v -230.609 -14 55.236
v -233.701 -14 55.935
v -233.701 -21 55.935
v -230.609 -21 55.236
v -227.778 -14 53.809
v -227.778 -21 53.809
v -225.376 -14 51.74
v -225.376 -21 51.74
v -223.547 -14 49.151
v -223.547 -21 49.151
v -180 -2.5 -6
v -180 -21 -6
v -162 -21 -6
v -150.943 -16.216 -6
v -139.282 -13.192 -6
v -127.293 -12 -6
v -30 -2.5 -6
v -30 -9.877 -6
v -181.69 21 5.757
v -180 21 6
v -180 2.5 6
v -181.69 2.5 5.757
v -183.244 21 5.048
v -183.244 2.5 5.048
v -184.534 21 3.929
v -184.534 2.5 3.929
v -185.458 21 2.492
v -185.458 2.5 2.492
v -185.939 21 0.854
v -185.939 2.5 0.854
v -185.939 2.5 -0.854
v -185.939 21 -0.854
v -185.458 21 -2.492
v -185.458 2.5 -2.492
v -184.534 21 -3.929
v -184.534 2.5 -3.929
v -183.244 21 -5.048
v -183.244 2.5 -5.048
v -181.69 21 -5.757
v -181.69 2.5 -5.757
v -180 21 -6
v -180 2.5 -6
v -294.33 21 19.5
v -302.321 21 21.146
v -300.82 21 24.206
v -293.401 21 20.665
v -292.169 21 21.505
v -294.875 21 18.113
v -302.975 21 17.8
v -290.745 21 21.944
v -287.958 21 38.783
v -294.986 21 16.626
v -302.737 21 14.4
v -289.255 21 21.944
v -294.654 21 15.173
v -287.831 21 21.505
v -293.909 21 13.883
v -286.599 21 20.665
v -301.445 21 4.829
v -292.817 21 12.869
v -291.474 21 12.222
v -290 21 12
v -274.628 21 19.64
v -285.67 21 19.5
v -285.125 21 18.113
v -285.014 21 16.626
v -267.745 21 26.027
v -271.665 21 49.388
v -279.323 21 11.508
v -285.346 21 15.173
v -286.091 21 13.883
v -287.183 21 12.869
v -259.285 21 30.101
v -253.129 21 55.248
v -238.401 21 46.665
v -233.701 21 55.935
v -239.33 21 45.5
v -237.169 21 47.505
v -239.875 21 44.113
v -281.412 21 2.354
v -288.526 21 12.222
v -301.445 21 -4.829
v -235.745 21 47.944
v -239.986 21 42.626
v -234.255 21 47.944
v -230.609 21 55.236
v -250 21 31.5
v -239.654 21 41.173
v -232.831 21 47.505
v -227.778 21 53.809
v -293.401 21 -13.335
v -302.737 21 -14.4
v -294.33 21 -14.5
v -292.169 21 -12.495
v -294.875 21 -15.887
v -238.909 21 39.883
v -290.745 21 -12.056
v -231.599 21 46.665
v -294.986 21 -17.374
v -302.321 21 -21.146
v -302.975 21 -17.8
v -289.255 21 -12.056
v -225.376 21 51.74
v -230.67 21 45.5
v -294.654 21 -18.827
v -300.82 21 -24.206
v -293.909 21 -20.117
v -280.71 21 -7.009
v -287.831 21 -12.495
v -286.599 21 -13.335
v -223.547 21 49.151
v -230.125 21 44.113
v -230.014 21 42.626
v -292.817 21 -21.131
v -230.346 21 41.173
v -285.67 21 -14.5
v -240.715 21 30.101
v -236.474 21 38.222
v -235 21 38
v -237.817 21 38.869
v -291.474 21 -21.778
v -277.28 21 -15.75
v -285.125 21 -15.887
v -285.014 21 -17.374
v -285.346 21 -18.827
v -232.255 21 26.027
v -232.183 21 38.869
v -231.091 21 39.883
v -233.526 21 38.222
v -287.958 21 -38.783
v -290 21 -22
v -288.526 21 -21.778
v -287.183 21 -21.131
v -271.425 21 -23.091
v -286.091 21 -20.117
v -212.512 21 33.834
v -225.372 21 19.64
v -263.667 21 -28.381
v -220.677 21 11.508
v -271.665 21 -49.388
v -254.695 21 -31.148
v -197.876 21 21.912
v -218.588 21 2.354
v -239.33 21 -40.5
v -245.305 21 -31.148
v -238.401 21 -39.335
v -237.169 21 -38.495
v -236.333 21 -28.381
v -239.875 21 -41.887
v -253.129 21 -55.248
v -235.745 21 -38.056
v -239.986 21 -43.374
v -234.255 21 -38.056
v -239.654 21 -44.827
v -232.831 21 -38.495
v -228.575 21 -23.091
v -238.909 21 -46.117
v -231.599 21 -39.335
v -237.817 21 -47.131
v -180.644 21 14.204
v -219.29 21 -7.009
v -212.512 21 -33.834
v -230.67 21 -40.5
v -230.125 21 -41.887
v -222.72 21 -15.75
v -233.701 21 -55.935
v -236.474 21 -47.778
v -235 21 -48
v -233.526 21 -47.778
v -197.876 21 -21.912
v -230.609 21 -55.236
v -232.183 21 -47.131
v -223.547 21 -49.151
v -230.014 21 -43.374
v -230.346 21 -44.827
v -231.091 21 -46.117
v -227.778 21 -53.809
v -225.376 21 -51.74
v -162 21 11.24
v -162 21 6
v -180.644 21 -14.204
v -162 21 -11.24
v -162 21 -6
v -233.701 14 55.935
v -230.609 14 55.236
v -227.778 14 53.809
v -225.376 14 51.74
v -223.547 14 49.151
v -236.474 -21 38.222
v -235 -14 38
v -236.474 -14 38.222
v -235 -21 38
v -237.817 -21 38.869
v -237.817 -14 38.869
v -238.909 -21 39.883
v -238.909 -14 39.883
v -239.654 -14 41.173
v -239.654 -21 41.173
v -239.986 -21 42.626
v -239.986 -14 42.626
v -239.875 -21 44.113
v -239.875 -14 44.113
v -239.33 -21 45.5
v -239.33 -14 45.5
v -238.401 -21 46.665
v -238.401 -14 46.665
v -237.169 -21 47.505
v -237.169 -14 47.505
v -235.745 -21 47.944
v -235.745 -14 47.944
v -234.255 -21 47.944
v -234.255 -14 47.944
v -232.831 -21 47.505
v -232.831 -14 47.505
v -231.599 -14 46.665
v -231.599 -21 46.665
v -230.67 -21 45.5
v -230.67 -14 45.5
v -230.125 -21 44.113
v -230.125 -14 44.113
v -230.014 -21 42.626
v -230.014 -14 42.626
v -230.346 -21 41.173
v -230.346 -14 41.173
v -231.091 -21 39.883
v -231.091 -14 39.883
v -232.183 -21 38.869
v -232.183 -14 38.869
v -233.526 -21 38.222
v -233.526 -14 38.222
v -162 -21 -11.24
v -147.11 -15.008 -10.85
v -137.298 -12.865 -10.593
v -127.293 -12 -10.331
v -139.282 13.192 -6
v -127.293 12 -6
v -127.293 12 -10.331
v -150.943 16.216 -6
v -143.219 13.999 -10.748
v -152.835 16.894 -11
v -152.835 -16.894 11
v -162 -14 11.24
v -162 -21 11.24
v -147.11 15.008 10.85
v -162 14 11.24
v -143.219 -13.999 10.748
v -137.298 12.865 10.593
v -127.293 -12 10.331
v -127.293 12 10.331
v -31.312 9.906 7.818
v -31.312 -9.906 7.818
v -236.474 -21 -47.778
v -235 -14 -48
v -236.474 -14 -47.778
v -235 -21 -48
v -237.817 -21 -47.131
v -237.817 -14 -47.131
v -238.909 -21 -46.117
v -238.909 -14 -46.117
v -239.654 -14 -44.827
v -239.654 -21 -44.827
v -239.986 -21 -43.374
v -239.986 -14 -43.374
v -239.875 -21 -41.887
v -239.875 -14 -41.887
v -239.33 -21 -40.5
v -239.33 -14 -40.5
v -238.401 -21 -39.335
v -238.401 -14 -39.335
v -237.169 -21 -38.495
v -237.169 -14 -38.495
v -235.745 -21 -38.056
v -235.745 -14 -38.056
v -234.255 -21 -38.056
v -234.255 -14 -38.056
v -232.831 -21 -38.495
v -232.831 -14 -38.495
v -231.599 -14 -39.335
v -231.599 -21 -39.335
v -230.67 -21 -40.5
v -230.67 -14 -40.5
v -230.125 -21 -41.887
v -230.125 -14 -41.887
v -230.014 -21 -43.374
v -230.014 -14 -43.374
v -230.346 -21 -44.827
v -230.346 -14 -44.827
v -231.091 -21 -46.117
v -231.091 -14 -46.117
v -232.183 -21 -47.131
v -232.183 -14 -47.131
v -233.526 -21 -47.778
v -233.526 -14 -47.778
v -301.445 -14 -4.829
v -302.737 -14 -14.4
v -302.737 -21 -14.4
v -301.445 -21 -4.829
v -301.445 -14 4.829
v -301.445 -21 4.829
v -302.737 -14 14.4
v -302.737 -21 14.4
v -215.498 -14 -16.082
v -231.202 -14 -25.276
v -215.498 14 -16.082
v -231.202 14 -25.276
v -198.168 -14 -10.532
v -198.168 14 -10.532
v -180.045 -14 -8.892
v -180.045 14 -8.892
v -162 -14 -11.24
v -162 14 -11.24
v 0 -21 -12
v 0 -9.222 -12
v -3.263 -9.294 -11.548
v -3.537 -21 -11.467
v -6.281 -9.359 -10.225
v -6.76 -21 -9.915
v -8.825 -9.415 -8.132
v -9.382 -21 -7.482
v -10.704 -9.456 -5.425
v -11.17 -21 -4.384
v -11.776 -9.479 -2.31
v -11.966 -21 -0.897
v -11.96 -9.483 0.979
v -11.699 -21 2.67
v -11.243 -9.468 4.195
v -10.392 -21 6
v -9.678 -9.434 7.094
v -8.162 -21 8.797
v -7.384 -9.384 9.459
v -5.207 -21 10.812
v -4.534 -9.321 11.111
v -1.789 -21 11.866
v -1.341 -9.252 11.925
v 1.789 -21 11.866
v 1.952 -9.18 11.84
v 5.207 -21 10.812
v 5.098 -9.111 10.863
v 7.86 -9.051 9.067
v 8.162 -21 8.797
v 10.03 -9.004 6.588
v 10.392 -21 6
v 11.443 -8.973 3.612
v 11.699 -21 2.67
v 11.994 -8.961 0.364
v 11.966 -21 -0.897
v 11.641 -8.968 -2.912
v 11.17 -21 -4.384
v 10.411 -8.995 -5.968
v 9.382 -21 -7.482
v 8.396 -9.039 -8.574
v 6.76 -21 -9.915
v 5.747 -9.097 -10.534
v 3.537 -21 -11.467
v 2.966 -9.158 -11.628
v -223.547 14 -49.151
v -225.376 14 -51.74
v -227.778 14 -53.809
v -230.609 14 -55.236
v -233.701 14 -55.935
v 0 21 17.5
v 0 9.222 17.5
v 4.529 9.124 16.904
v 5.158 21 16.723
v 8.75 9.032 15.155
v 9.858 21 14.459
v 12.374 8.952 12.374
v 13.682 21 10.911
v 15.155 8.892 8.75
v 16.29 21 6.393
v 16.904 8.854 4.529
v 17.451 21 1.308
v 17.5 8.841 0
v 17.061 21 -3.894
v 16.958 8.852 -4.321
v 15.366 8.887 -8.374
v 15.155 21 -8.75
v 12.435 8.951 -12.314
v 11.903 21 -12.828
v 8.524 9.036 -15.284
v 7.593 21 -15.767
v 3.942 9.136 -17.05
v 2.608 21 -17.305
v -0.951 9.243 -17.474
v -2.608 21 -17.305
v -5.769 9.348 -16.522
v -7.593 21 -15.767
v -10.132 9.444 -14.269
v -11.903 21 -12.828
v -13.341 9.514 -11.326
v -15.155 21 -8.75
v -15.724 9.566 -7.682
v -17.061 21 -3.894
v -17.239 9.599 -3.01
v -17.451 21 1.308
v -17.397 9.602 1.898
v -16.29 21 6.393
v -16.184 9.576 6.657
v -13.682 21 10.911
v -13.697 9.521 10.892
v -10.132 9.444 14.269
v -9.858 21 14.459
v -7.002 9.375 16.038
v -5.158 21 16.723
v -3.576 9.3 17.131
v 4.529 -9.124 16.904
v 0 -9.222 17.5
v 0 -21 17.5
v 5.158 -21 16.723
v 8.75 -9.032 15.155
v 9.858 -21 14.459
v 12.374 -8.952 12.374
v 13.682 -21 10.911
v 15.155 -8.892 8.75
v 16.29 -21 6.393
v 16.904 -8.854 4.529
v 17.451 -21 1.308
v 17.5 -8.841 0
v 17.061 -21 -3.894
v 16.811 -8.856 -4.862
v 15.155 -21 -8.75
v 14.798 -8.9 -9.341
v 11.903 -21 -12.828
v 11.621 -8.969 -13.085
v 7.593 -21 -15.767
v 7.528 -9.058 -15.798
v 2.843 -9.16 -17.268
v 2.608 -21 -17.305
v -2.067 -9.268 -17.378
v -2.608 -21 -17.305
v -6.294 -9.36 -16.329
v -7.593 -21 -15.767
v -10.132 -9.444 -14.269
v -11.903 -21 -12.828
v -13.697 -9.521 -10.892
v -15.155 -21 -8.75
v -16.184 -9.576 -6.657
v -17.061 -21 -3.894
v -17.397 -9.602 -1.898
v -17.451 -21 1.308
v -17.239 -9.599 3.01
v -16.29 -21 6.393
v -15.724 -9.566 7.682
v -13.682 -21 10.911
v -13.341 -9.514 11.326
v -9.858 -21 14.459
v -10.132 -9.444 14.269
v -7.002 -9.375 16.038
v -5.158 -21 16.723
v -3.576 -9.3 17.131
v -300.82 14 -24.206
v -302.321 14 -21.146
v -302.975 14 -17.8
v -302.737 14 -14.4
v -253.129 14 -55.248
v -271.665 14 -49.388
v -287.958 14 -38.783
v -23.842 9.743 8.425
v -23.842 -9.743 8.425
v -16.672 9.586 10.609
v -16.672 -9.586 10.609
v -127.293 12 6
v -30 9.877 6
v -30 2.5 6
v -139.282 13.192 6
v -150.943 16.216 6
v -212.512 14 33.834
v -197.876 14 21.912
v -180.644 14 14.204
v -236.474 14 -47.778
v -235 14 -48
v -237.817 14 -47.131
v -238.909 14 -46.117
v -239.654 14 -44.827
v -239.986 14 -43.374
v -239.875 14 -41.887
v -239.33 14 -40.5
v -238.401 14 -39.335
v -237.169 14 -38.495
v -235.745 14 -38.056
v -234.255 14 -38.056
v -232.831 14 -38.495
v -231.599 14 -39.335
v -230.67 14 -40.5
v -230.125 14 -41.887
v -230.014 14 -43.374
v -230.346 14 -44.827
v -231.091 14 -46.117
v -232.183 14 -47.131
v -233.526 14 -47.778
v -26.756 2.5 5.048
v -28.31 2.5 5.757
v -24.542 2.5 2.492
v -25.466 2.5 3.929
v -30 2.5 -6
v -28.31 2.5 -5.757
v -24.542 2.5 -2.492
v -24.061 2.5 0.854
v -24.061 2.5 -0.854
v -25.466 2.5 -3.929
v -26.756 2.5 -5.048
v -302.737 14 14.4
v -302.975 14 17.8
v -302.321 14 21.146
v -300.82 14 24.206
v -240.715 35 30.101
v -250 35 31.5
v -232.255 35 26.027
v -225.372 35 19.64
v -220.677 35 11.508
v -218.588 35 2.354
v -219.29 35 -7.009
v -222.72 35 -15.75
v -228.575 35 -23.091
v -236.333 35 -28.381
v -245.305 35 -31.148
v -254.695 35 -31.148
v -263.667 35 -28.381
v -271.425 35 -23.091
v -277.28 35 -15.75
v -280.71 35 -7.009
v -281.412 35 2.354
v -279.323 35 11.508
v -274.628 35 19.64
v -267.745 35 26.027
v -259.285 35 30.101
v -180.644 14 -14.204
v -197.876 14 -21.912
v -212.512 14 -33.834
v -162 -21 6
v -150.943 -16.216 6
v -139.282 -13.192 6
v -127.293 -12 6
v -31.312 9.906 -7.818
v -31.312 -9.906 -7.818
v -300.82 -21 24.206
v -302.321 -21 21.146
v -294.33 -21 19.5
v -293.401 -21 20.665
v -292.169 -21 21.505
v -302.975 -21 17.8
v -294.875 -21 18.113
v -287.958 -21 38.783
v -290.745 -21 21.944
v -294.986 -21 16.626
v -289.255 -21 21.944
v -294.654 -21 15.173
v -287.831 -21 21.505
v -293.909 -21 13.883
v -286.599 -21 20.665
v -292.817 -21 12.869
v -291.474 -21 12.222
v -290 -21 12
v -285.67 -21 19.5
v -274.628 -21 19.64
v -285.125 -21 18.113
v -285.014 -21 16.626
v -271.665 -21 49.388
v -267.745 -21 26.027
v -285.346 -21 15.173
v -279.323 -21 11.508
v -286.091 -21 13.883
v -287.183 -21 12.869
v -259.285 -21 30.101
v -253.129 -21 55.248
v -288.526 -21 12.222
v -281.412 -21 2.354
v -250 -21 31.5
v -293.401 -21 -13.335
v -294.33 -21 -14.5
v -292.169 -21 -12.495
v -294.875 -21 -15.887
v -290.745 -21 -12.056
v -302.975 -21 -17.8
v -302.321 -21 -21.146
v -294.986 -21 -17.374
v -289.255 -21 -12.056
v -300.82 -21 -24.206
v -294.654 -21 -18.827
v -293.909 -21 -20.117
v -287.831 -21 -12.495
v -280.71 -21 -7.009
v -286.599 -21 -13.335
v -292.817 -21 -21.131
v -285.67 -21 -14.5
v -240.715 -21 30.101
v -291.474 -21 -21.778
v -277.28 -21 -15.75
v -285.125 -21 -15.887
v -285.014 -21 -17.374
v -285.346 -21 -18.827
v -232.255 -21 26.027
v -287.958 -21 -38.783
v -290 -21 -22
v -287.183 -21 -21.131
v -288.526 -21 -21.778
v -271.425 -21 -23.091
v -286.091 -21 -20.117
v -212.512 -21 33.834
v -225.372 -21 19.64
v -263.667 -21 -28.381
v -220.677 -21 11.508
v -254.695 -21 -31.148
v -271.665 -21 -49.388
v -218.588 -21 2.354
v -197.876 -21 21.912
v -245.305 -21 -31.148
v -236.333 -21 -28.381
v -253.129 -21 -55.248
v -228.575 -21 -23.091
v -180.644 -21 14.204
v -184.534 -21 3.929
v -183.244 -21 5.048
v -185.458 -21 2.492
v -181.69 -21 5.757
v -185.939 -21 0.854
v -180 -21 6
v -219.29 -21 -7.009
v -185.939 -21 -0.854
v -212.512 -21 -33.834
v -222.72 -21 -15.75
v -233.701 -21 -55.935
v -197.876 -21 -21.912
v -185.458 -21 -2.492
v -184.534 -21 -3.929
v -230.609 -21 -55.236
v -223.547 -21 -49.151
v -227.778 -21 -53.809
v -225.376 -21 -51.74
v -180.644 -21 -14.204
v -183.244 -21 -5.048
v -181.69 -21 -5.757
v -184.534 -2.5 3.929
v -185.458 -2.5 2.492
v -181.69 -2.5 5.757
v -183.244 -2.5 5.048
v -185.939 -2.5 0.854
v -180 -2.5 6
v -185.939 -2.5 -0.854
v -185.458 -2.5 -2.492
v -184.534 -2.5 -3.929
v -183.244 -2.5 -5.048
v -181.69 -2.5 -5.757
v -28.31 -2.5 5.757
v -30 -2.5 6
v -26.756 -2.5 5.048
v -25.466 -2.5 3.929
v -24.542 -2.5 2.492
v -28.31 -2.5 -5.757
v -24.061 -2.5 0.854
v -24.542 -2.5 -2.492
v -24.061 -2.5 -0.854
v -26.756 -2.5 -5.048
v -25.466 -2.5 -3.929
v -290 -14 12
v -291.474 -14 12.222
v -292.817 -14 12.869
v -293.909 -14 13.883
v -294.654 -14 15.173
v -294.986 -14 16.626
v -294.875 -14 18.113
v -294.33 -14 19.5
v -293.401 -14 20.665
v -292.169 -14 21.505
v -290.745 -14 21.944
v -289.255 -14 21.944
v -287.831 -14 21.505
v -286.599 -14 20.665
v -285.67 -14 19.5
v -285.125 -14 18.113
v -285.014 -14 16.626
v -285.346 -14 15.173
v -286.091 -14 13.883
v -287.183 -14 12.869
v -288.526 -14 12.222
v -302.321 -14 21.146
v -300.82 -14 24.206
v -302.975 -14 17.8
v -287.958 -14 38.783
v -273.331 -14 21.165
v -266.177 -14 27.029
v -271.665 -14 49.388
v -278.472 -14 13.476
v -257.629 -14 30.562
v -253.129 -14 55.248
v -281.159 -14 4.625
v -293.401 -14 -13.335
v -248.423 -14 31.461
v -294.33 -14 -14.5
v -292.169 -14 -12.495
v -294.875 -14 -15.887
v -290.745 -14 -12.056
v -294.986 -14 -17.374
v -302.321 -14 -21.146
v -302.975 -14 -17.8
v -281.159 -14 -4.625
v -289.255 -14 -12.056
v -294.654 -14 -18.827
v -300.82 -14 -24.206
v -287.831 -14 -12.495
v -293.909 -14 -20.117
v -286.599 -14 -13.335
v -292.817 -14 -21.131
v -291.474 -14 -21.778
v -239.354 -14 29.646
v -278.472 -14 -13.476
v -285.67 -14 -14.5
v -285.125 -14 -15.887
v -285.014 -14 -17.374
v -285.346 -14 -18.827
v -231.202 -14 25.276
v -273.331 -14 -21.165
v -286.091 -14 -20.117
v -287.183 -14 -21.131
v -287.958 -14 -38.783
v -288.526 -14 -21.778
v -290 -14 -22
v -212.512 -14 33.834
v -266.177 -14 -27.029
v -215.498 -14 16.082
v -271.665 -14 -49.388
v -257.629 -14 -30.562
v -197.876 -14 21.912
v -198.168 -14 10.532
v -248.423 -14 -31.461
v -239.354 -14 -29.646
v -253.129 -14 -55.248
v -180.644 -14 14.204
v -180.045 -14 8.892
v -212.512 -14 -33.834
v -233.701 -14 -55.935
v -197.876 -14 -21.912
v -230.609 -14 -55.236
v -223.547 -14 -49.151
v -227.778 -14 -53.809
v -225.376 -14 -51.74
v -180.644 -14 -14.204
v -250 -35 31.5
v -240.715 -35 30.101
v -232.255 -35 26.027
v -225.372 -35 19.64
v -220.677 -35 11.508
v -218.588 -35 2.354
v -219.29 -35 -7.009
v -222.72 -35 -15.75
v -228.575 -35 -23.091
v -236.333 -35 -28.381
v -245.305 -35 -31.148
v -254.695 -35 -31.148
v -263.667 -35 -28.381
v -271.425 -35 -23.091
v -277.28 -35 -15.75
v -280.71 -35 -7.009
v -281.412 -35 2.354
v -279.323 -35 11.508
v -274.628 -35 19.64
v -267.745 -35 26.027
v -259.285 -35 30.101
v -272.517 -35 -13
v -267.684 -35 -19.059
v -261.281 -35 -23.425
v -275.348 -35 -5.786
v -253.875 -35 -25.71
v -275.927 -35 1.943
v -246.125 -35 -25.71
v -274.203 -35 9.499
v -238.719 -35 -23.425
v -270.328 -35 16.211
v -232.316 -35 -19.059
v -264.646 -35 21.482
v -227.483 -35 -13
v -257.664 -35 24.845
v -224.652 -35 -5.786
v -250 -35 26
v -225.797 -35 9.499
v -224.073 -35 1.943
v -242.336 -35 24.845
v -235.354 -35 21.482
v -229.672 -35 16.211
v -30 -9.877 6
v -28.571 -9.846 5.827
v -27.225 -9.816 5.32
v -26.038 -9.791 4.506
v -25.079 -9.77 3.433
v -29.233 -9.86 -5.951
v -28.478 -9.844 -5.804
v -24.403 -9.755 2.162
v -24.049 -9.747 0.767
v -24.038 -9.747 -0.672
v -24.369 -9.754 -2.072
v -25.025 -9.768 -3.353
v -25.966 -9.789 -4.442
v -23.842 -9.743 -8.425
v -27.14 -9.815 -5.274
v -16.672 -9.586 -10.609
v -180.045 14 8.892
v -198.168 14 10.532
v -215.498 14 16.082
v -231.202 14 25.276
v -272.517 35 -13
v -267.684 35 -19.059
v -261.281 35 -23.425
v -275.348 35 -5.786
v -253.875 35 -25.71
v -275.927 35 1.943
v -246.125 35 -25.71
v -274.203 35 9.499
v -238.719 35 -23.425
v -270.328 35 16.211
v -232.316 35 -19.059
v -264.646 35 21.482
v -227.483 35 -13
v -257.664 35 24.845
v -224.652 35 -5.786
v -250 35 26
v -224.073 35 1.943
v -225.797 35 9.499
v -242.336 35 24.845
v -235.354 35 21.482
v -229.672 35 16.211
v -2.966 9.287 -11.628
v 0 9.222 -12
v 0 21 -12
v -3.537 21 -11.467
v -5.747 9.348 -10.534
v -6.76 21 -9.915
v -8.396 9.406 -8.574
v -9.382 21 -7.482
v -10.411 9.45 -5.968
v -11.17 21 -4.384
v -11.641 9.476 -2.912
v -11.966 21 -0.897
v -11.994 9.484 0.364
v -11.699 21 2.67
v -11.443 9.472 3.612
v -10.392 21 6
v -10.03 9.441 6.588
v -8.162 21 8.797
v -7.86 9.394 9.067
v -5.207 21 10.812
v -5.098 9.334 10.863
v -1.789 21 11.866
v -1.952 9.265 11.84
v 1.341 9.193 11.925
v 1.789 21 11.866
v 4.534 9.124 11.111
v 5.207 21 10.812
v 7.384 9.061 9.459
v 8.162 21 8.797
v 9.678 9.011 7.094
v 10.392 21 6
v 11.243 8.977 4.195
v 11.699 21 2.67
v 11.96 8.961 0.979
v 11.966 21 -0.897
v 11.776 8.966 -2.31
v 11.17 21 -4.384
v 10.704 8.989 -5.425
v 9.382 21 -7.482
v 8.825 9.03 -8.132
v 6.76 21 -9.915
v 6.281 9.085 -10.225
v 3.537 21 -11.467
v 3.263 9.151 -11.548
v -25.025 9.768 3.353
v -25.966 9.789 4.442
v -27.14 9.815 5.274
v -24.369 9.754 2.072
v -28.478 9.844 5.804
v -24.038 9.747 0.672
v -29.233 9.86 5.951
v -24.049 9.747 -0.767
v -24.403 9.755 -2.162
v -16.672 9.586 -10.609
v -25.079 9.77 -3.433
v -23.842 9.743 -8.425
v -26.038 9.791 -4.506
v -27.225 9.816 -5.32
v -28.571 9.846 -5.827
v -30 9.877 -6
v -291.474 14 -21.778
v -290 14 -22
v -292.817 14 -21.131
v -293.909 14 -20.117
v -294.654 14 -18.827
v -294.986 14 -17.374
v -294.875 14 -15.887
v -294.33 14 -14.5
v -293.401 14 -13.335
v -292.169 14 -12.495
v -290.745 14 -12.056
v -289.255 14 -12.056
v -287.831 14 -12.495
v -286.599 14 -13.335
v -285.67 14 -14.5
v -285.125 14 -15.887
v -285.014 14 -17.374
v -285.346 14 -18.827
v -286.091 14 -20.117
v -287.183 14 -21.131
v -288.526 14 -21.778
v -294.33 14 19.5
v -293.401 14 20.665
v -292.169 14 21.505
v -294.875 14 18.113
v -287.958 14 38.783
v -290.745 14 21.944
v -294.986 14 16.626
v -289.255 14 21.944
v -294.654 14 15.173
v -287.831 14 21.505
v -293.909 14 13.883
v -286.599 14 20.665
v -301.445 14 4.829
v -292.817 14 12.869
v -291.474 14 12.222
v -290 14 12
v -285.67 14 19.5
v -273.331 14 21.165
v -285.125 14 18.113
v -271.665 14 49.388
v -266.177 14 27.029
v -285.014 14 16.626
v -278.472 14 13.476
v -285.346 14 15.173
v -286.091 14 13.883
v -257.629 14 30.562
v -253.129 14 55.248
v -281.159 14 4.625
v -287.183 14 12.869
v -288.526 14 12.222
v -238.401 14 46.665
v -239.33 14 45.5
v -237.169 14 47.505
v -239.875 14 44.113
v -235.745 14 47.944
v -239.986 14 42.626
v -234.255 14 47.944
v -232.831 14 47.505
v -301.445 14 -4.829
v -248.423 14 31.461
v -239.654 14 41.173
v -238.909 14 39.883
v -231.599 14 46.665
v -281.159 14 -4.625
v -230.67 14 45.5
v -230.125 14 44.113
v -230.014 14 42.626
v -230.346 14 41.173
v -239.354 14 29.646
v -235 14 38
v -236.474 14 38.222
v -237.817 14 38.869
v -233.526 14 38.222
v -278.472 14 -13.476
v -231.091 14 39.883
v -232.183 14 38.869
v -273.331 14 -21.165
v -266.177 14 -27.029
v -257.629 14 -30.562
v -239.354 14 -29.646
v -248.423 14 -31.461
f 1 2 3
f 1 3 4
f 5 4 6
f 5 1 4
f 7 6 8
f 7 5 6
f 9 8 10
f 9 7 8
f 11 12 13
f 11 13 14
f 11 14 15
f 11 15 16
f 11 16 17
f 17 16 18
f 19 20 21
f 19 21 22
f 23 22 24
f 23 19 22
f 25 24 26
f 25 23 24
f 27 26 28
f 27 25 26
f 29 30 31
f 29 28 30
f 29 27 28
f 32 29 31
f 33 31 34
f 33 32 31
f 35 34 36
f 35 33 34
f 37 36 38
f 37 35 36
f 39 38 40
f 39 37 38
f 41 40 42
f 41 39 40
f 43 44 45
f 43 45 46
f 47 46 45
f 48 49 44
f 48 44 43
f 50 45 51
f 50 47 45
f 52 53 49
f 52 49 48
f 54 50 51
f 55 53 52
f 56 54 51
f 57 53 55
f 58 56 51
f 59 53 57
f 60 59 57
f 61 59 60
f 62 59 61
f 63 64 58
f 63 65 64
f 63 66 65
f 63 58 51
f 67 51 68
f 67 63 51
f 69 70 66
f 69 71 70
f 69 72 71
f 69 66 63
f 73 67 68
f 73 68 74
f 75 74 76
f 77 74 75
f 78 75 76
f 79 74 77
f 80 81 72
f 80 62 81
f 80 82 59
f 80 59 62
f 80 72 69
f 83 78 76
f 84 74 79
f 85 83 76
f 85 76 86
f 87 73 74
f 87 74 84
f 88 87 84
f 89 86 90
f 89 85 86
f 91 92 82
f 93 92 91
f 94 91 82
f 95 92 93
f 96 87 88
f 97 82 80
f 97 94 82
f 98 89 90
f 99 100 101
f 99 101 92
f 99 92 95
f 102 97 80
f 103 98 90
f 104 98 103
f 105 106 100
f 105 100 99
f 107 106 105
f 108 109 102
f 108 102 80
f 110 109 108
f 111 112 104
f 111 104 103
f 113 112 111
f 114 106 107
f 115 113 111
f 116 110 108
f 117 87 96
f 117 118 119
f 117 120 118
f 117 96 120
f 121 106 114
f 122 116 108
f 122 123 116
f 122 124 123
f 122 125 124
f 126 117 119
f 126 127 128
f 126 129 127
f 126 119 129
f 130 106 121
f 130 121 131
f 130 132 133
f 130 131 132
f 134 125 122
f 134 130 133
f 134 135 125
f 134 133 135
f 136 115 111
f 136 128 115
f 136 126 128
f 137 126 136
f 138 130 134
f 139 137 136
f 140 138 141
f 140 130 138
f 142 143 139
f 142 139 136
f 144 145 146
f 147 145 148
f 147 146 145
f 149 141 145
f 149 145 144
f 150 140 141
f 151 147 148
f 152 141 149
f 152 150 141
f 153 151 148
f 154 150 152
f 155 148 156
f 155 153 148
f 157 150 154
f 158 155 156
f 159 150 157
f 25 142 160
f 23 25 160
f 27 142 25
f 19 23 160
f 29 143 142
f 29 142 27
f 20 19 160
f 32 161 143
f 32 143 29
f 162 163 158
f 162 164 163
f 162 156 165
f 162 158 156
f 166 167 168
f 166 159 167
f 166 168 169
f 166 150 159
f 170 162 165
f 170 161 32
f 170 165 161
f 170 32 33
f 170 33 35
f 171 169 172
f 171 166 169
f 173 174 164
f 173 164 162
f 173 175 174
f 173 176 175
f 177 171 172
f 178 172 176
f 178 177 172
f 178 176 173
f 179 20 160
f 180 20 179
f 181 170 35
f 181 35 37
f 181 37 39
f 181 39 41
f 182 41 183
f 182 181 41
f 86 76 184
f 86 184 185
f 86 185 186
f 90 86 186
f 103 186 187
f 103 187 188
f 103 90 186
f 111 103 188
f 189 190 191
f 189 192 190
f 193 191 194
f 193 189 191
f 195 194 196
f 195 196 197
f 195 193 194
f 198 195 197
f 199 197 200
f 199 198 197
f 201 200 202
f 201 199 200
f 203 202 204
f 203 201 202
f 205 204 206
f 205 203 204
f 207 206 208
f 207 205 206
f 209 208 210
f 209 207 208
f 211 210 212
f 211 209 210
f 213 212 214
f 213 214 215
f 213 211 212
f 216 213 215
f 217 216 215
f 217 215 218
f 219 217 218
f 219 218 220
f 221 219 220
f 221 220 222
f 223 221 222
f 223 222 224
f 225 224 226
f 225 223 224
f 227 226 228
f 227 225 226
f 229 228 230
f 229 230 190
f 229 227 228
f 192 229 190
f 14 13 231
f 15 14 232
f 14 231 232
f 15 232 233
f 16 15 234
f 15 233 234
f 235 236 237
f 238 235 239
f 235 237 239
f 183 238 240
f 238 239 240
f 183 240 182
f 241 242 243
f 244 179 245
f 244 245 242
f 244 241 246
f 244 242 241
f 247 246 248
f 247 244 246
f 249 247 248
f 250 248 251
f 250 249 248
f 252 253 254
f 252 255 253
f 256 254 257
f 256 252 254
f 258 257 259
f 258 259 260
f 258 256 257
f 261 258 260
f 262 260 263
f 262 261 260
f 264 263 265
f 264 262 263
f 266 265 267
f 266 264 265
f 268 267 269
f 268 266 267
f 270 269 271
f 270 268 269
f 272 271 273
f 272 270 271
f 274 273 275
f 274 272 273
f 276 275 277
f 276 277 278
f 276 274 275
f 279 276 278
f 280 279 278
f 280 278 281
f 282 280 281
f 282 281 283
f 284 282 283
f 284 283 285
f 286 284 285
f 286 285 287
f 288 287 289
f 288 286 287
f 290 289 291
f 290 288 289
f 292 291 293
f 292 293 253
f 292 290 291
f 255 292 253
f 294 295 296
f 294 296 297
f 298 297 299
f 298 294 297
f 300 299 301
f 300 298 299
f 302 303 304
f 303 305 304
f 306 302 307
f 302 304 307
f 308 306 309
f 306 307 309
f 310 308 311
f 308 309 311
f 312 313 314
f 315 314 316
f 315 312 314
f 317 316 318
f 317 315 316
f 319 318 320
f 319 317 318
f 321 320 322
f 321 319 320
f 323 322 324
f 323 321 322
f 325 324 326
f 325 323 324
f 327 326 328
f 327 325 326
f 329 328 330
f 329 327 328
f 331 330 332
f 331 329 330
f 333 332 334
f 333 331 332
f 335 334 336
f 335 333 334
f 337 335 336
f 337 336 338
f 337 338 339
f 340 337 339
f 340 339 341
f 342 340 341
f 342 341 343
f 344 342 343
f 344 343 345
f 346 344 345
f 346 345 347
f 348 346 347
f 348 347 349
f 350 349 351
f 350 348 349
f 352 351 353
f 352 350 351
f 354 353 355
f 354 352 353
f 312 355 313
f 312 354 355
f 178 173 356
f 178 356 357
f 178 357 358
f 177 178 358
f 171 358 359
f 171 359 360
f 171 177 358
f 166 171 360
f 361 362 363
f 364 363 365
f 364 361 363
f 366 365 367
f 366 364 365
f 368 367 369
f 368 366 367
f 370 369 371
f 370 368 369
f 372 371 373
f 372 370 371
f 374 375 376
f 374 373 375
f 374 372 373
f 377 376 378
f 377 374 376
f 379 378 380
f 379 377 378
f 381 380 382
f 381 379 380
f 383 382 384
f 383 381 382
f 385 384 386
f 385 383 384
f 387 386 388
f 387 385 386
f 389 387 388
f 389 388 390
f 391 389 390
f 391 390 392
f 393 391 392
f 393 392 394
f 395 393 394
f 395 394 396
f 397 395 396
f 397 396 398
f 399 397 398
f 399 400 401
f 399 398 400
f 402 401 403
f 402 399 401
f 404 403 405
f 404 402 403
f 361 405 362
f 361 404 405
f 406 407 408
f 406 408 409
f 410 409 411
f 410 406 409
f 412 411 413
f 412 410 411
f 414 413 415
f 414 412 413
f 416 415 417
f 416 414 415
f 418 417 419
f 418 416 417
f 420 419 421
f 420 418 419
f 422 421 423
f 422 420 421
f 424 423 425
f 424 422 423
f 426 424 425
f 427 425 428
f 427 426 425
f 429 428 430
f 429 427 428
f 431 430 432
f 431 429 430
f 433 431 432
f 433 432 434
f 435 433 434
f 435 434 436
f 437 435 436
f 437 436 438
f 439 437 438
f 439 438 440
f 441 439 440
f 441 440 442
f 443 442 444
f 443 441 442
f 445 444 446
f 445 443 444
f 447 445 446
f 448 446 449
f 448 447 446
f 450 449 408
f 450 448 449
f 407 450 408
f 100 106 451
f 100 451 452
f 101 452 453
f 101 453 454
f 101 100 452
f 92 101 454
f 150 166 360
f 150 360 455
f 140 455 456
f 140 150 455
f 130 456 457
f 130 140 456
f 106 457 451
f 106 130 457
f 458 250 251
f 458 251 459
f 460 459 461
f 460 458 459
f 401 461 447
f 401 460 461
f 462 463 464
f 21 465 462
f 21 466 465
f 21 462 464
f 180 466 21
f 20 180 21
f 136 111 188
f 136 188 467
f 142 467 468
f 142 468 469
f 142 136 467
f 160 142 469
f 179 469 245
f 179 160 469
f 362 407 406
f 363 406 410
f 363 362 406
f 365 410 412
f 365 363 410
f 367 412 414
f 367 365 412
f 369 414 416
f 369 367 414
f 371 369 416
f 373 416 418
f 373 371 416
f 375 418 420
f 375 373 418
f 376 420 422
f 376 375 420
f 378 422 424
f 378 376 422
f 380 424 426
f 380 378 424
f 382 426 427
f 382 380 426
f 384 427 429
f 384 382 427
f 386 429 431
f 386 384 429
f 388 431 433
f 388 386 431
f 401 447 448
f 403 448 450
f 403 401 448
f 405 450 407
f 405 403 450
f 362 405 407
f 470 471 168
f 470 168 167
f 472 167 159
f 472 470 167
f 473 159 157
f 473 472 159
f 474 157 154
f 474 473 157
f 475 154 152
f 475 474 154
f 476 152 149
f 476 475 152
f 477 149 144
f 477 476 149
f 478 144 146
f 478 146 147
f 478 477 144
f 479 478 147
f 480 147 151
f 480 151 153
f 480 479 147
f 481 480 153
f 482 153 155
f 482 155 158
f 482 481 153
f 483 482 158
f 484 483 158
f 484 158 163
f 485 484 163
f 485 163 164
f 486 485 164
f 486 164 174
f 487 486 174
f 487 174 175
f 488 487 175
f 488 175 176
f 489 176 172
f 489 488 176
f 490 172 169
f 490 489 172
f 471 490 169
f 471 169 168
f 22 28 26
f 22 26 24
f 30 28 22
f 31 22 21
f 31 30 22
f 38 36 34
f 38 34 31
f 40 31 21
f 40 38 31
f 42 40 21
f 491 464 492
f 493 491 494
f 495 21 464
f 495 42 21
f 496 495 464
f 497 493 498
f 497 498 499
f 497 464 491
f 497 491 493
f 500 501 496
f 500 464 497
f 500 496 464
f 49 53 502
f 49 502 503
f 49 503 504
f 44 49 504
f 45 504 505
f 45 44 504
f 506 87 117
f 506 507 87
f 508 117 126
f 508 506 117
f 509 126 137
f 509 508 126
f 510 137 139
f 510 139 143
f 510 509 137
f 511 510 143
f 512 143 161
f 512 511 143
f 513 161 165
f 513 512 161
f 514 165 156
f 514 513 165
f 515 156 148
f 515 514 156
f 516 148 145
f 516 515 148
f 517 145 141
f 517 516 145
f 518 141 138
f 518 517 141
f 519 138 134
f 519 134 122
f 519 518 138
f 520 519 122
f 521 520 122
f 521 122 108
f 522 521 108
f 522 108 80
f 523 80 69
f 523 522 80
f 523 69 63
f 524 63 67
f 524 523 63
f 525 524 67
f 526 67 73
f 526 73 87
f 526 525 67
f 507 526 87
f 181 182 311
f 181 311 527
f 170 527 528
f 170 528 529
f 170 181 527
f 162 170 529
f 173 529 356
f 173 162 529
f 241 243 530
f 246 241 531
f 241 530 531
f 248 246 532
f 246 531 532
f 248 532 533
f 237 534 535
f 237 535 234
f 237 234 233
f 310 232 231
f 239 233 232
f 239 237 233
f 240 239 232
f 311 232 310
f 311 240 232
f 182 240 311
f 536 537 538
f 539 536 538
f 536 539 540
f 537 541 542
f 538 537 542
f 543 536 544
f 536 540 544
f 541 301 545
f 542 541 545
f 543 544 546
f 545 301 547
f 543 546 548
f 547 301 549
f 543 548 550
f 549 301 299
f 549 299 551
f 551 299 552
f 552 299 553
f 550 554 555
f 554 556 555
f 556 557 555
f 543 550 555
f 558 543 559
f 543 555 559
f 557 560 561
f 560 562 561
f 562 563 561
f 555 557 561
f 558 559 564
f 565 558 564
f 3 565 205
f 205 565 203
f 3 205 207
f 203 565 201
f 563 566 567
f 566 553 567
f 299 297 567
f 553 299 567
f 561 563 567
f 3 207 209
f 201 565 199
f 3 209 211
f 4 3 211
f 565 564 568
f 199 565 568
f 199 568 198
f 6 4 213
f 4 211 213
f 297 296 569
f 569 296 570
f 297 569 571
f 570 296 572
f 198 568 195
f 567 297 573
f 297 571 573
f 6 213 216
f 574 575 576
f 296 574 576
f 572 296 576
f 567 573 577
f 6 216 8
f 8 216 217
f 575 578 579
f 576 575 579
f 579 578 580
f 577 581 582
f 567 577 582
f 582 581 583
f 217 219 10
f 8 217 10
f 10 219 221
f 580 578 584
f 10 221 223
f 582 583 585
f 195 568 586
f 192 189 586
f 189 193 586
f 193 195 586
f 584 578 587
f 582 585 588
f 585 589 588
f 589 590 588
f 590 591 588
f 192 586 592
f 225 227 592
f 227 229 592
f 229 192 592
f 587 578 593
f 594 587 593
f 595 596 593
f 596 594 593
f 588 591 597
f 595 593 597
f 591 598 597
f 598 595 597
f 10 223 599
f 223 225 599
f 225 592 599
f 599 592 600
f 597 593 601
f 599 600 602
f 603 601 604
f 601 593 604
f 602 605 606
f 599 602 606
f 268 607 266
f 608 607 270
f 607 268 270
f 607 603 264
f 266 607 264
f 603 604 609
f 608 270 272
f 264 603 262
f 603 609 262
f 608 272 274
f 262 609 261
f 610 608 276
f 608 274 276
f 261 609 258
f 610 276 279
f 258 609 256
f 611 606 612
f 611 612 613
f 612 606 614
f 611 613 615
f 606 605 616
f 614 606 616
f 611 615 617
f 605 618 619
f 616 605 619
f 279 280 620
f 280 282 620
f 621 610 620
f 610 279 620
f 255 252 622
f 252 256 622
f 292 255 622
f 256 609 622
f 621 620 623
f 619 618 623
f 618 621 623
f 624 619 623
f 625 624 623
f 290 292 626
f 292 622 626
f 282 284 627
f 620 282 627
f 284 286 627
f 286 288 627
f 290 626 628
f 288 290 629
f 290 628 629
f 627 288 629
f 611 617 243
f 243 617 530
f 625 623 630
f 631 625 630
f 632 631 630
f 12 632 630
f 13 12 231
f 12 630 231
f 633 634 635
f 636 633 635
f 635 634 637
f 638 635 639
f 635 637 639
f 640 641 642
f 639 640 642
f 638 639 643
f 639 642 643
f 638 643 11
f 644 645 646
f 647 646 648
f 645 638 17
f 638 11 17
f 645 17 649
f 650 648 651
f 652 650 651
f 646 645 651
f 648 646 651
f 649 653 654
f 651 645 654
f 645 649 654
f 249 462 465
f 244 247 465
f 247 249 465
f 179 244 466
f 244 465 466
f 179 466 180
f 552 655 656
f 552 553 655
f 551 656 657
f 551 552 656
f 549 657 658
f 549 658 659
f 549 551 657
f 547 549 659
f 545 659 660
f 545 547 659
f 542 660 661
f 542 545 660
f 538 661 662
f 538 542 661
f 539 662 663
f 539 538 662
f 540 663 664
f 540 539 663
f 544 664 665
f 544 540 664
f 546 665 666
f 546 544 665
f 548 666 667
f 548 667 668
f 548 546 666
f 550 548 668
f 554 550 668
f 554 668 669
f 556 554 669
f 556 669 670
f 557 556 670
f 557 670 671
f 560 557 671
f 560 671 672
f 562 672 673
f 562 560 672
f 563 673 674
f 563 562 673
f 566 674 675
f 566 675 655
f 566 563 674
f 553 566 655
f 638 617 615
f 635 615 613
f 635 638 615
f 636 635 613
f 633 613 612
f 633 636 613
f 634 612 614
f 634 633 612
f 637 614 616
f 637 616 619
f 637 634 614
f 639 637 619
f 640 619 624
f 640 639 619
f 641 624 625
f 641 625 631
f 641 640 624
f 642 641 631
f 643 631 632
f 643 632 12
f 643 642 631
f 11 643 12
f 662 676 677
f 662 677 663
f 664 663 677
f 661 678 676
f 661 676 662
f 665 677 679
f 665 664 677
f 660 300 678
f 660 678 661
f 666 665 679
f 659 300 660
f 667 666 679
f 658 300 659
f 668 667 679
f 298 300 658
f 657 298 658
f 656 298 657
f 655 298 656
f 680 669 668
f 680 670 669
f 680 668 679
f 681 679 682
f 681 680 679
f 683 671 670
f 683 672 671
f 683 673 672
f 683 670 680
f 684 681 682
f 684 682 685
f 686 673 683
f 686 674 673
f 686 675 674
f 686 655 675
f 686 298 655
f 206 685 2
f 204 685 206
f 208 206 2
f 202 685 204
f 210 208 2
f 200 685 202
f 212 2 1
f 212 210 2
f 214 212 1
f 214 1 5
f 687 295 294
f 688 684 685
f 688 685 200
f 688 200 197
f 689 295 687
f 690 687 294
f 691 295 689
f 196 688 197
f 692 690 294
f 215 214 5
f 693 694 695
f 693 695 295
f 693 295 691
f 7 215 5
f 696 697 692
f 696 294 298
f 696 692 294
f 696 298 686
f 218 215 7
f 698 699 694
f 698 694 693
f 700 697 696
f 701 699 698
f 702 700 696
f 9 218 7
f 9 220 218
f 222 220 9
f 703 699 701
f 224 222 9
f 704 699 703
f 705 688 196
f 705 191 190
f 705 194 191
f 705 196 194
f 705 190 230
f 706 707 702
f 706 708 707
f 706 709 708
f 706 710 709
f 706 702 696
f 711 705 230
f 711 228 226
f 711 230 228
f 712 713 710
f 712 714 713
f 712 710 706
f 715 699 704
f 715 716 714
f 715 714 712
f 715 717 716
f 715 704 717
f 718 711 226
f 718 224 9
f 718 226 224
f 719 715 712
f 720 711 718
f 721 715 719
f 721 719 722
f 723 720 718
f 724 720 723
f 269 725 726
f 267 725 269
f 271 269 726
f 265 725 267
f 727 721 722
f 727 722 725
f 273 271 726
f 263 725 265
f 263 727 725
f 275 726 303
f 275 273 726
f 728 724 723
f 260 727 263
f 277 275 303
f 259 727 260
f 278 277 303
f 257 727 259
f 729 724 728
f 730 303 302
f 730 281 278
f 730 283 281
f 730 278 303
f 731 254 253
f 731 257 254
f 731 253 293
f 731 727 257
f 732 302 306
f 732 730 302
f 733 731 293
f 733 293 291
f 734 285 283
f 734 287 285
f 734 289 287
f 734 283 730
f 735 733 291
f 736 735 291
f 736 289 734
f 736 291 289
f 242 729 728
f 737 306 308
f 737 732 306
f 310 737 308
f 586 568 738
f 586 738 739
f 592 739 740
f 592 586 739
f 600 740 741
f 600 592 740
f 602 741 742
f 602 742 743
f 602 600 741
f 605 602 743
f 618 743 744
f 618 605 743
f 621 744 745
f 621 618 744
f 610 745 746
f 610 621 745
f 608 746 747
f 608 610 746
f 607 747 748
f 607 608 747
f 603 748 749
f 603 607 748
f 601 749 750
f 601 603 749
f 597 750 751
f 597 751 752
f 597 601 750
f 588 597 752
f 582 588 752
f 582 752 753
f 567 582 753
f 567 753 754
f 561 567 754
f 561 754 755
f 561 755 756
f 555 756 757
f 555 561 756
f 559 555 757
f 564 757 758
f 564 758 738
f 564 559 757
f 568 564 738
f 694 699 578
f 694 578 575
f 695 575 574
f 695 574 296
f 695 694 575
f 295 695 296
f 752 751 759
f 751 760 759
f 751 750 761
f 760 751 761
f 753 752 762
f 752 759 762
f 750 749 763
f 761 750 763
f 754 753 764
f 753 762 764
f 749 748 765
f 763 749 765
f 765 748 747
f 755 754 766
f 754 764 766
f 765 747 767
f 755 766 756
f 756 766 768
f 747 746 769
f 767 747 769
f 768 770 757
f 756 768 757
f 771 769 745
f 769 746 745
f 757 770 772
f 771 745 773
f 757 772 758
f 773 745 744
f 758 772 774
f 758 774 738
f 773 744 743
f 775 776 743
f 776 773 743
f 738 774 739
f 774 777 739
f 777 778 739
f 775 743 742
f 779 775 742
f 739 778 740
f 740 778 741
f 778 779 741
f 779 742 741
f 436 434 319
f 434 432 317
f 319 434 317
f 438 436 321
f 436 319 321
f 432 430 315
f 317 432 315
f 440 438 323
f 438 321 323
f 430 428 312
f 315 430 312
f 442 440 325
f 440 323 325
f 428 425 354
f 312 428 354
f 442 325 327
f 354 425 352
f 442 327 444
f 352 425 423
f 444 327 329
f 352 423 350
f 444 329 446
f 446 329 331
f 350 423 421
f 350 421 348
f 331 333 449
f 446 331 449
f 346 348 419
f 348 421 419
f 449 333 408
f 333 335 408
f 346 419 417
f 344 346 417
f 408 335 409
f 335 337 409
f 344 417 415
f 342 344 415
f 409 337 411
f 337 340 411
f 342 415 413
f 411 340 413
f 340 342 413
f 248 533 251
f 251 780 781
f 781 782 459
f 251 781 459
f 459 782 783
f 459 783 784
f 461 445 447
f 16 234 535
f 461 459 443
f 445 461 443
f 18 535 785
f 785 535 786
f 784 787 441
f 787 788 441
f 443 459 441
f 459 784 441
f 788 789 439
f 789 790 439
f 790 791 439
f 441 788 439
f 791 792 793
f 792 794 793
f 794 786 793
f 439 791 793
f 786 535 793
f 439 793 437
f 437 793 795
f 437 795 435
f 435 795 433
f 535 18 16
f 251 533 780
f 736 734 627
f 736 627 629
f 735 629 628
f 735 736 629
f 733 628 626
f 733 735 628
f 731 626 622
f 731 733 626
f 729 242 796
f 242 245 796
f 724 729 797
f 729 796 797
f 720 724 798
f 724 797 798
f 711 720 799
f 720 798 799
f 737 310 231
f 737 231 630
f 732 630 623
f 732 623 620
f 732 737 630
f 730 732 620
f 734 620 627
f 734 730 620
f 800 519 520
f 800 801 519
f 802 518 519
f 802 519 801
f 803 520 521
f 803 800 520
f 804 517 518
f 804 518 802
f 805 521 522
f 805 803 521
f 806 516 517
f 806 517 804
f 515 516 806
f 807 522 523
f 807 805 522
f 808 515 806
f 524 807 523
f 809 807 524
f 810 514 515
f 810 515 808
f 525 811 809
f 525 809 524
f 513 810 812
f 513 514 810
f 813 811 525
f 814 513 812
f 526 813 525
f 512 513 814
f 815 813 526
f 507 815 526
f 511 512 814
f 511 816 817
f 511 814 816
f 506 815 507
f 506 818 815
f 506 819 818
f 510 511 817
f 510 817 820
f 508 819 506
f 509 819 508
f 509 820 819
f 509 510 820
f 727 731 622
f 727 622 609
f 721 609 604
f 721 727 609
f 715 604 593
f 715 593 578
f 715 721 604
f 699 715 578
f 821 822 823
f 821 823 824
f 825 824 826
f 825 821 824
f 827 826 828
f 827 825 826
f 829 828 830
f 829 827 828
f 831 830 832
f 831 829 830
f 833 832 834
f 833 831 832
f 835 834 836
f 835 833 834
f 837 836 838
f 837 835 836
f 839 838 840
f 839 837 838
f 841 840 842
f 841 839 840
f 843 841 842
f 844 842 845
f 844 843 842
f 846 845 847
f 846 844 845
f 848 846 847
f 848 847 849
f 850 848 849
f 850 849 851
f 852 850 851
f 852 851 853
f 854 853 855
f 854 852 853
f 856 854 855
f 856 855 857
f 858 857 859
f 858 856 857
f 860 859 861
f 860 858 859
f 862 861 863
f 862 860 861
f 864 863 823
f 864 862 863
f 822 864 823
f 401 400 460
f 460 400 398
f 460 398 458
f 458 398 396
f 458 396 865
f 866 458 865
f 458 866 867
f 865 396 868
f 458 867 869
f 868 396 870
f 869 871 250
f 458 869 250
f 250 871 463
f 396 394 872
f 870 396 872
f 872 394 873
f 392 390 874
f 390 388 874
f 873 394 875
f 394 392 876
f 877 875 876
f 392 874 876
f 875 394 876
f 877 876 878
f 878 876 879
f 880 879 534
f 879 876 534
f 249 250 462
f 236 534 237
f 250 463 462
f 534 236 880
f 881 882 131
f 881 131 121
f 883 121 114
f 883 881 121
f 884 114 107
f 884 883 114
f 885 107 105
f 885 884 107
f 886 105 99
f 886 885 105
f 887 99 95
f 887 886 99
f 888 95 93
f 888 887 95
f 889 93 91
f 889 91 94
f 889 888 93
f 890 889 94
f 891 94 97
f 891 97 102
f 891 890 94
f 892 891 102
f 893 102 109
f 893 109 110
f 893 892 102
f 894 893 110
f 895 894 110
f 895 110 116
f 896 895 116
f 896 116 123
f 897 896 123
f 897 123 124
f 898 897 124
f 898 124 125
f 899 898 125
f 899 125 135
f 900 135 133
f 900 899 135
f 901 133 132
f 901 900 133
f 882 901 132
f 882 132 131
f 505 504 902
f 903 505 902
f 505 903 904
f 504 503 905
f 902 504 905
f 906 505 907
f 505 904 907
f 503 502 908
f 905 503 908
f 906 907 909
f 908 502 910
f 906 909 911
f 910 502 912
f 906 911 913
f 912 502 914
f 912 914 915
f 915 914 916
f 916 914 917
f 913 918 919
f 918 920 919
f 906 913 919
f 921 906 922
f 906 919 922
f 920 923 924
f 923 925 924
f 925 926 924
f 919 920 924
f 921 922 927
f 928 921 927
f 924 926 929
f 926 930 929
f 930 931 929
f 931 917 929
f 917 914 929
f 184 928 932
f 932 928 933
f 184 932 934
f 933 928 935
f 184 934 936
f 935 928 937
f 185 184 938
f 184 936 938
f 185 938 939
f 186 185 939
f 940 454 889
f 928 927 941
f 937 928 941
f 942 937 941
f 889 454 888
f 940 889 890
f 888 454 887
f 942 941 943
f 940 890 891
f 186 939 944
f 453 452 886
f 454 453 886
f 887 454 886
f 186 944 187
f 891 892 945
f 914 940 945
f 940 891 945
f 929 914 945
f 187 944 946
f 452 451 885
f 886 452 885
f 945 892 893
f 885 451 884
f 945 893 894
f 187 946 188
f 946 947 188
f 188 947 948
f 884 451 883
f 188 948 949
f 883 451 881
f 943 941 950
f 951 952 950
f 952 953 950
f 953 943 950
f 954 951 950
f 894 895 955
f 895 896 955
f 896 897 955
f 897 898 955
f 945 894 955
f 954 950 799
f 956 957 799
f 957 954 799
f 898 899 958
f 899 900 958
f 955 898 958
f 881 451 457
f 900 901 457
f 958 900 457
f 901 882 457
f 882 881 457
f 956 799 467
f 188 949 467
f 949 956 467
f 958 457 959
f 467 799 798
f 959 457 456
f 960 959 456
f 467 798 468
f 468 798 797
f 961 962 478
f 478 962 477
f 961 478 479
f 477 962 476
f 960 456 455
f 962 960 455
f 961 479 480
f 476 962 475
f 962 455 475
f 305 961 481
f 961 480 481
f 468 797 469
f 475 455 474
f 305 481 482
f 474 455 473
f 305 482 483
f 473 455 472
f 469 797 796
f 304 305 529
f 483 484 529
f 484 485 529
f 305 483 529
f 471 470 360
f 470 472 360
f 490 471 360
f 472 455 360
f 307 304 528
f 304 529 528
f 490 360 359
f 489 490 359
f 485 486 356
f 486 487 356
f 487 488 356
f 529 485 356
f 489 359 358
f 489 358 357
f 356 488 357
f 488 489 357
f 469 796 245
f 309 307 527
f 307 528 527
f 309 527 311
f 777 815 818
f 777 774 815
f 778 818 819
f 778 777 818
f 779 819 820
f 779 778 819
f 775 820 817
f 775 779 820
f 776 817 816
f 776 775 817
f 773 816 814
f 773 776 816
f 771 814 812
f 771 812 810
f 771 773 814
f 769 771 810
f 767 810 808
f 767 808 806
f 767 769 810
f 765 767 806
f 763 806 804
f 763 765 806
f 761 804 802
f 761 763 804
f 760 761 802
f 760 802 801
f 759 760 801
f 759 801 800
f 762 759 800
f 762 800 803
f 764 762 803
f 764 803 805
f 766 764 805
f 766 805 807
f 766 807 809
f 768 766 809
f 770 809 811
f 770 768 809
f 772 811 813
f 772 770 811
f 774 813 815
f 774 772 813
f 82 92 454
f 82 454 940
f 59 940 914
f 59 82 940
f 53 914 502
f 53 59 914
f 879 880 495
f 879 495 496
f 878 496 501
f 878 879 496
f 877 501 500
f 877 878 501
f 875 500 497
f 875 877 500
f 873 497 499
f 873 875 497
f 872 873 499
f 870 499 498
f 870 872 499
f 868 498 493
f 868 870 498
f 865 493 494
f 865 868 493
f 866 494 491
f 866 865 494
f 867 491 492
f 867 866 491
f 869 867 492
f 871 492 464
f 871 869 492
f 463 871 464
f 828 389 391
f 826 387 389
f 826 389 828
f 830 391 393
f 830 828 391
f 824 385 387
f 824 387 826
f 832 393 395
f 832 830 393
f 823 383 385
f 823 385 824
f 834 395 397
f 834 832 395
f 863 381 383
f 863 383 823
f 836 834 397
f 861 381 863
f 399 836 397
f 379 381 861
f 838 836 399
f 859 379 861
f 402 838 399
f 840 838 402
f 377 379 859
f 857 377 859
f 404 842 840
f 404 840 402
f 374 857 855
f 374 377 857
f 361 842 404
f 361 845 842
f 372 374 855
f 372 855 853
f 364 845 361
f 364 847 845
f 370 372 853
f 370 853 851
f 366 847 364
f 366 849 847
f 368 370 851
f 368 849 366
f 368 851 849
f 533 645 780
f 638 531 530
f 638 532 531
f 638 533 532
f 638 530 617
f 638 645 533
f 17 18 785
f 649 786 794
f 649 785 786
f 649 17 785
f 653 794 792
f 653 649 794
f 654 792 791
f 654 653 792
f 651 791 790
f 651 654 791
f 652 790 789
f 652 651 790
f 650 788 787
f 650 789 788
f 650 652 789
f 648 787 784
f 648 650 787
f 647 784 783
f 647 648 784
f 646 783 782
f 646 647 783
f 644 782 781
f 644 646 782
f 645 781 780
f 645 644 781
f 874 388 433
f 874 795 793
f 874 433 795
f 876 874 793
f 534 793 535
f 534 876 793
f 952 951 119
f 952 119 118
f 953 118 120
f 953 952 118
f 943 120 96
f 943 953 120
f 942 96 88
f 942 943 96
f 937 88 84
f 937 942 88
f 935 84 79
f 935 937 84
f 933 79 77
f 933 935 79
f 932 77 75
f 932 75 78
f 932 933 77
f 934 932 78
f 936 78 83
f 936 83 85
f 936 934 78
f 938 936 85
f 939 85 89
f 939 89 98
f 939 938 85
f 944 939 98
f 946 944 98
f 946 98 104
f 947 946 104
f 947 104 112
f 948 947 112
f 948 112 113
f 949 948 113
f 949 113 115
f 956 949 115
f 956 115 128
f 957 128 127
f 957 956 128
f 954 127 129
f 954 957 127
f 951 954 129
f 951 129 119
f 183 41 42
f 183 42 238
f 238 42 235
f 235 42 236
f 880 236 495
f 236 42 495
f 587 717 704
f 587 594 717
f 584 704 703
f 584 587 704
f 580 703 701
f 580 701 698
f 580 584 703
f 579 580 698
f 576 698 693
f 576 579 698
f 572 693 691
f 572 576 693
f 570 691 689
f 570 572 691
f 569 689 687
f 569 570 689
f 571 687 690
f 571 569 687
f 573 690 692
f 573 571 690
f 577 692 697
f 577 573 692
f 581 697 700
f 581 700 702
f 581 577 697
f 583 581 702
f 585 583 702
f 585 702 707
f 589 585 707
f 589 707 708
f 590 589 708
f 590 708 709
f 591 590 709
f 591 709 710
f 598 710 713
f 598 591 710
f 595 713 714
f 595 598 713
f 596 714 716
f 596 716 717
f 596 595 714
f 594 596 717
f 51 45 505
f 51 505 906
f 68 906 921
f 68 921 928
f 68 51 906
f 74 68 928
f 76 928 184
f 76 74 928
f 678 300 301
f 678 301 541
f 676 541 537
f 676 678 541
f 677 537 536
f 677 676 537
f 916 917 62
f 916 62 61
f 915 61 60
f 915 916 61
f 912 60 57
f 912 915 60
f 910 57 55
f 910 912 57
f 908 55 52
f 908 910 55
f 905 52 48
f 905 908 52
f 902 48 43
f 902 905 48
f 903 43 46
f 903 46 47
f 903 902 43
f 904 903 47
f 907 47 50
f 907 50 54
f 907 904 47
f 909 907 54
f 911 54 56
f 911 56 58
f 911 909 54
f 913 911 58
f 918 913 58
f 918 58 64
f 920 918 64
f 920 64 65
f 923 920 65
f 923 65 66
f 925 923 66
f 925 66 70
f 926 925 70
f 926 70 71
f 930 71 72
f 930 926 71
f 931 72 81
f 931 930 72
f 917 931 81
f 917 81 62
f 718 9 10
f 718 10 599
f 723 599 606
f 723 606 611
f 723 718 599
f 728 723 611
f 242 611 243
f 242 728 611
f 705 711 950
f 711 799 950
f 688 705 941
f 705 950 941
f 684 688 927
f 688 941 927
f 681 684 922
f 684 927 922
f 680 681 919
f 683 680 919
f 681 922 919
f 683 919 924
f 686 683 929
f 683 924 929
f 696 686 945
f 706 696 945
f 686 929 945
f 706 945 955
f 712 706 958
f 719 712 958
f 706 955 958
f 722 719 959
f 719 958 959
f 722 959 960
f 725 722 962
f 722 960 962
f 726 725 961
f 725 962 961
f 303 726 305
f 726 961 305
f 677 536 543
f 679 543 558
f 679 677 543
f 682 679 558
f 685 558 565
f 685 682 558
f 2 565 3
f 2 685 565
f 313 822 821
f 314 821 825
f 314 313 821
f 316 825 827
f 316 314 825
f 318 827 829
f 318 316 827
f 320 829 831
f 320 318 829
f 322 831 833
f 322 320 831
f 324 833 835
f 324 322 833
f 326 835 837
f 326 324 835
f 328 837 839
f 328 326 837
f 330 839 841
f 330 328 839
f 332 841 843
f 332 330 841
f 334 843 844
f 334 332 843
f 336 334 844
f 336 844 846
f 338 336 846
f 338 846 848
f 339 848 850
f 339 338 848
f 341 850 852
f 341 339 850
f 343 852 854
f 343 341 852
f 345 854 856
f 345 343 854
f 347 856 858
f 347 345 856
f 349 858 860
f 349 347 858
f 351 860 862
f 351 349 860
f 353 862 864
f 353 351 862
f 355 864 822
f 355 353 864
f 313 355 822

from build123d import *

# Parameters (mm, degrees)
SKETCH1_R               = 12
BOSS_EXTRUDE1_DEPTH     = 21
SKETCH1_3_R             = 26
BOSS_EXTRUDE2_DEPTH     = 35
SKETCH1_4_R             = 31.5
SKETCH1_4_R_2           = 5
BOSS_EXTRUDE3_DEPTH     = 21
BOSS_EXTRUDE4_DEPTH     = 2.5
CUT_EXTRUDE1_DEPTH      = 311.166315701
CUT_EXTRUDE1_DEPTH_BACK = 311.166315701
SKETCH1_6_R             = 12
BOSS_EXTRUDE5_DEPTH     = 21
SKETCH1_7_R             = 5
CUT_EXTRUDE2_DEPTH      = 14


with BuildPart() as part:
    # Sketch1 → Boss-Extrude1 (new, symmetric)
    with BuildSketch(Plane(origin=(0, 0, 0), x_dir=(1, 0, 0), z_dir=(0, 1, 0))):
        with BuildLine():
            ThreePointArc((17.5, 0), (8.02934676, 15.549263346), (-10.131953212, 14.268620259))
            ThreePointArc((-10.131953212, 14.268620259), (-17.5, 0), (-10.131953212, -14.268620259))
            ThreePointArc((-10.131953212, -14.268620259), (8.02934676, -15.549263346), (17.5, 0))
        make_face()
        Circle(SKETCH1_R, mode=Mode.SUBTRACT)
    extrude(amount=BOSS_EXTRUDE1_DEPTH, both=True)



with BuildPart() as body_2:
    # Sketch1<3> → Boss-Extrude2 (new, symmetric)
    with BuildSketch(Plane(origin=(0, 0, 0), x_dir=(1, 0, 0), z_dir=(0, 1, 0))):
        with BuildLine():
            ThreePointArc((-218.5, 0), (-221.853950514, 14.143899687), (-231.201580847, 25.275866699))
            ThreePointArc((-231.201580847, 25.275866699), (-281.5, 0), (-231.201580847, -25.275866699))
            ThreePointArc((-231.201580847, -25.275866699), (-221.853950514, -14.143899687), (-218.5, 0))
        make_face()
        with Locations((-250, 0)):
            Circle(SKETCH1_3_R, mode=Mode.SUBTRACT)
    extrude(amount=BOSS_EXTRUDE2_DEPTH, both=True)


with BuildPart() as part_1:
    add(part.part)

    add(body_2.part)  # Boss-Extrude3 merges body 2
    # Sketch1<4> → Boss-Extrude3 (add, symmetric)
    with BuildSketch(Plane(origin=(0, 0, 0), x_dir=(1, 0, 0), z_dir=(0, 1, 0))):
        with BuildLine():
            ThreePointArc((-10.131953212, 14.268620259), (-20.198477773, 9.324322534), (-31.312052828, 7.817854403))
            Line((-31.312052828, 7.817854403), (-162, 11.240038738))
            ThreePointArc((-162, 11.240038738), (-197.875878659, 21.911731191), (-223.547039722, 49.150585409))
            ThreePointArc((-223.547039722, 49.150585409), (-227.777941589, 53.8093419), (-233.701306889, 55.934967963))
            ThreePointArc((-233.701306889, 55.934967963), (-271.66540115, 49.388348587), (-300.819950957, 24.206154404))
            ThreePointArc((-300.819950957, 24.206154404), (-302.758398561, 19.494647504), (-302.737346662, 14.4))
            ThreePointArc((-302.737346662, 14.4), (-301.282651255, 0), (-302.737346662, -14.4))
            ThreePointArc((-302.737346662, -14.4), (-302.758398561, -19.494647504), (-300.819950957, -24.206154404))
            ThreePointArc((-300.819950957, -24.206154404), (-271.66540115, -49.388348587), (-233.701306889, -55.934967963))
            ThreePointArc((-233.701306889, -55.934967963), (-227.777941589, -53.8093419), (-223.547039722, -49.150585409))
            ThreePointArc((-223.547039722, -49.150585409), (-197.875878659, -21.911731191), (-162, -11.240038738))
            Line((-162, -11.240038738), (-31.312052828, -7.817854403))
            ThreePointArc((-31.312052828, -7.817854403), (-20.198477773, -9.324322534), (-10.131953212, -14.268620259))
            ThreePointArc((-10.131953212, -14.268620259), (-17.5, 0), (-10.131953212, 14.268620259))
        make_face()
        with Locations((-250, 0)):
            Circle(SKETCH1_4_R, mode=Mode.SUBTRACT)
        with BuildLine():
            ThreePointArc((-180, -6), (-186, 0), (-180, 6))
            Line((-180, 6), (-30, 6))
            ThreePointArc((-30, 6), (-24, 0), (-30, -6))
            Line((-30, -6), (-180, -6))
        make_face(mode=Mode.SUBTRACT)
        with Locations((-290, 17)):
            Circle(SKETCH1_4_R_2, mode=Mode.SUBTRACT)
        with Locations((-235, 43)):
            Circle(SKETCH1_4_R_2, mode=Mode.SUBTRACT)
        with Locations((-235, -43)):
            Circle(SKETCH1_4_R_2, mode=Mode.SUBTRACT)
        with Locations((-290, -17)):
            Circle(SKETCH1_4_R_2, mode=Mode.SUBTRACT)
    extrude(amount=BOSS_EXTRUDE3_DEPTH, both=True)

    # Sketch1<5> → Boss-Extrude4 (add, symmetric)
    with BuildSketch(Plane(origin=(0, 0, 0), x_dir=(1, 0, 0), z_dir=(0, 1, 0))):
        with BuildLine():
            Line((-30, 6), (-180, 6))
            ThreePointArc((-180, 6), (-186, 0), (-180, -6))
            Line((-180, -6), (-30, -6))
            ThreePointArc((-30, -6), (-24, 0), (-30, 6))
        make_face()
    extrude(amount=BOSS_EXTRUDE4_DEPTH, both=True)

    # Sketch3 → Cut-Extrude1 (cut, two sides: drawn at the far end of the back side and taken through both)
    with BuildSketch(Plane.XY.offset(-CUT_EXTRUDE1_DEPTH_BACK)):
        with BuildLine():
            ThreePointArc((-162, 21), (-145.170802033, 14.478720031), (-127.293303783, 12))
            Line((-127.293303783, 12), (17.5, 8.840598872))
            Line((17.5, 8.840598872), (17.5, 21))
            Line((17.5, 21), (-162, 21))
        make_face()
        with BuildLine():
            Line((17.5, -8.840598872), (-127.293303783, -12))
            ThreePointArc((-127.293303783, -12), (-145.170802033, -14.478720031), (-162, -21))
            Line((-162, -21), (17.5, -21))
            Line((17.5, -21), (17.5, -8.840598872))
        make_face()
    extrude(amount=CUT_EXTRUDE1_DEPTH + CUT_EXTRUDE1_DEPTH_BACK, mode=Mode.SUBTRACT)

    # Sketch1<6> → Boss-Extrude5 (add, symmetric)
    with BuildSketch(Plane(origin=(0, 0, 0), x_dir=(1, 0, 0), z_dir=(0, 1, 0))):
        with BuildLine():
            ThreePointArc((17.5, 0), (8.02934676, 15.549263346), (-10.131953212, 14.268620259))
            ThreePointArc((-10.131953212, 14.268620259), (-17.5, 0), (-10.131953212, -14.268620259))
            ThreePointArc((-10.131953212, -14.268620259), (8.02934676, -15.549263346), (17.5, 0))
        make_face()
        Circle(SKETCH1_6_R, mode=Mode.SUBTRACT)
    extrude(amount=BOSS_EXTRUDE5_DEPTH, both=True)

    # Sketch1<7> → Cut-Extrude2 (cut, symmetric)
    with BuildSketch(Plane(origin=(0, 0, 0), x_dir=(1, 0, 0), z_dir=(0, 1, 0))):
        with BuildLine():
            ThreePointArc((-231.201580847, 25.275866699), (-198.167794768, 10.53206878), (-162, 11.240038738))
            ThreePointArc((-162, 11.240038738), (-197.875878659, 21.911731191), (-223.547039722, 49.150585409))
            ThreePointArc((-223.547039722, 49.150585409), (-227.777941589, 53.8093419), (-233.701306889, 55.934967963))
            ThreePointArc((-233.701306889, 55.934967963), (-271.66540115, 49.388348587), (-300.819950957, 24.206154404))
            ThreePointArc((-300.819950957, 24.206154404), (-302.758398561, 19.494647504), (-302.737346662, 14.4))
            ThreePointArc((-302.737346662, 14.4), (-301.282651255, 0), (-302.737346662, -14.4))
            ThreePointArc((-302.737346662, -14.4), (-302.758398561, -19.494647504), (-300.819950957, -24.206154404))
            ThreePointArc((-300.819950957, -24.206154404), (-271.66540115, -49.388348587), (-233.701306889, -55.934967963))
            ThreePointArc((-233.701306889, -55.934967963), (-227.777941589, -53.8093419), (-223.547039722, -49.150585409))
            ThreePointArc((-223.547039722, -49.150585409), (-197.875878659, -21.911731191), (-162, -11.240038738))
            ThreePointArc((-162, -11.240038738), (-198.167794768, -10.53206878), (-231.201580847, -25.275866699))
            ThreePointArc((-231.201580847, -25.275866699), (-281.5, 0), (-231.201580847, 25.275866699))
        make_face()
        with Locations((-235, -43)):
            Circle(SKETCH1_7_R, mode=Mode.SUBTRACT)
        with Locations((-290, -17)):
            Circle(SKETCH1_7_R, mode=Mode.SUBTRACT)
        with Locations((-290, 17)):
            Circle(SKETCH1_7_R, mode=Mode.SUBTRACT)
        with Locations((-235, 43)):
            Circle(SKETCH1_7_R, mode=Mode.SUBTRACT)
    extrude(amount=CUT_EXTRUDE2_DEPTH, both=True, mode=Mode.SUBTRACT)


solid = part_1.part
